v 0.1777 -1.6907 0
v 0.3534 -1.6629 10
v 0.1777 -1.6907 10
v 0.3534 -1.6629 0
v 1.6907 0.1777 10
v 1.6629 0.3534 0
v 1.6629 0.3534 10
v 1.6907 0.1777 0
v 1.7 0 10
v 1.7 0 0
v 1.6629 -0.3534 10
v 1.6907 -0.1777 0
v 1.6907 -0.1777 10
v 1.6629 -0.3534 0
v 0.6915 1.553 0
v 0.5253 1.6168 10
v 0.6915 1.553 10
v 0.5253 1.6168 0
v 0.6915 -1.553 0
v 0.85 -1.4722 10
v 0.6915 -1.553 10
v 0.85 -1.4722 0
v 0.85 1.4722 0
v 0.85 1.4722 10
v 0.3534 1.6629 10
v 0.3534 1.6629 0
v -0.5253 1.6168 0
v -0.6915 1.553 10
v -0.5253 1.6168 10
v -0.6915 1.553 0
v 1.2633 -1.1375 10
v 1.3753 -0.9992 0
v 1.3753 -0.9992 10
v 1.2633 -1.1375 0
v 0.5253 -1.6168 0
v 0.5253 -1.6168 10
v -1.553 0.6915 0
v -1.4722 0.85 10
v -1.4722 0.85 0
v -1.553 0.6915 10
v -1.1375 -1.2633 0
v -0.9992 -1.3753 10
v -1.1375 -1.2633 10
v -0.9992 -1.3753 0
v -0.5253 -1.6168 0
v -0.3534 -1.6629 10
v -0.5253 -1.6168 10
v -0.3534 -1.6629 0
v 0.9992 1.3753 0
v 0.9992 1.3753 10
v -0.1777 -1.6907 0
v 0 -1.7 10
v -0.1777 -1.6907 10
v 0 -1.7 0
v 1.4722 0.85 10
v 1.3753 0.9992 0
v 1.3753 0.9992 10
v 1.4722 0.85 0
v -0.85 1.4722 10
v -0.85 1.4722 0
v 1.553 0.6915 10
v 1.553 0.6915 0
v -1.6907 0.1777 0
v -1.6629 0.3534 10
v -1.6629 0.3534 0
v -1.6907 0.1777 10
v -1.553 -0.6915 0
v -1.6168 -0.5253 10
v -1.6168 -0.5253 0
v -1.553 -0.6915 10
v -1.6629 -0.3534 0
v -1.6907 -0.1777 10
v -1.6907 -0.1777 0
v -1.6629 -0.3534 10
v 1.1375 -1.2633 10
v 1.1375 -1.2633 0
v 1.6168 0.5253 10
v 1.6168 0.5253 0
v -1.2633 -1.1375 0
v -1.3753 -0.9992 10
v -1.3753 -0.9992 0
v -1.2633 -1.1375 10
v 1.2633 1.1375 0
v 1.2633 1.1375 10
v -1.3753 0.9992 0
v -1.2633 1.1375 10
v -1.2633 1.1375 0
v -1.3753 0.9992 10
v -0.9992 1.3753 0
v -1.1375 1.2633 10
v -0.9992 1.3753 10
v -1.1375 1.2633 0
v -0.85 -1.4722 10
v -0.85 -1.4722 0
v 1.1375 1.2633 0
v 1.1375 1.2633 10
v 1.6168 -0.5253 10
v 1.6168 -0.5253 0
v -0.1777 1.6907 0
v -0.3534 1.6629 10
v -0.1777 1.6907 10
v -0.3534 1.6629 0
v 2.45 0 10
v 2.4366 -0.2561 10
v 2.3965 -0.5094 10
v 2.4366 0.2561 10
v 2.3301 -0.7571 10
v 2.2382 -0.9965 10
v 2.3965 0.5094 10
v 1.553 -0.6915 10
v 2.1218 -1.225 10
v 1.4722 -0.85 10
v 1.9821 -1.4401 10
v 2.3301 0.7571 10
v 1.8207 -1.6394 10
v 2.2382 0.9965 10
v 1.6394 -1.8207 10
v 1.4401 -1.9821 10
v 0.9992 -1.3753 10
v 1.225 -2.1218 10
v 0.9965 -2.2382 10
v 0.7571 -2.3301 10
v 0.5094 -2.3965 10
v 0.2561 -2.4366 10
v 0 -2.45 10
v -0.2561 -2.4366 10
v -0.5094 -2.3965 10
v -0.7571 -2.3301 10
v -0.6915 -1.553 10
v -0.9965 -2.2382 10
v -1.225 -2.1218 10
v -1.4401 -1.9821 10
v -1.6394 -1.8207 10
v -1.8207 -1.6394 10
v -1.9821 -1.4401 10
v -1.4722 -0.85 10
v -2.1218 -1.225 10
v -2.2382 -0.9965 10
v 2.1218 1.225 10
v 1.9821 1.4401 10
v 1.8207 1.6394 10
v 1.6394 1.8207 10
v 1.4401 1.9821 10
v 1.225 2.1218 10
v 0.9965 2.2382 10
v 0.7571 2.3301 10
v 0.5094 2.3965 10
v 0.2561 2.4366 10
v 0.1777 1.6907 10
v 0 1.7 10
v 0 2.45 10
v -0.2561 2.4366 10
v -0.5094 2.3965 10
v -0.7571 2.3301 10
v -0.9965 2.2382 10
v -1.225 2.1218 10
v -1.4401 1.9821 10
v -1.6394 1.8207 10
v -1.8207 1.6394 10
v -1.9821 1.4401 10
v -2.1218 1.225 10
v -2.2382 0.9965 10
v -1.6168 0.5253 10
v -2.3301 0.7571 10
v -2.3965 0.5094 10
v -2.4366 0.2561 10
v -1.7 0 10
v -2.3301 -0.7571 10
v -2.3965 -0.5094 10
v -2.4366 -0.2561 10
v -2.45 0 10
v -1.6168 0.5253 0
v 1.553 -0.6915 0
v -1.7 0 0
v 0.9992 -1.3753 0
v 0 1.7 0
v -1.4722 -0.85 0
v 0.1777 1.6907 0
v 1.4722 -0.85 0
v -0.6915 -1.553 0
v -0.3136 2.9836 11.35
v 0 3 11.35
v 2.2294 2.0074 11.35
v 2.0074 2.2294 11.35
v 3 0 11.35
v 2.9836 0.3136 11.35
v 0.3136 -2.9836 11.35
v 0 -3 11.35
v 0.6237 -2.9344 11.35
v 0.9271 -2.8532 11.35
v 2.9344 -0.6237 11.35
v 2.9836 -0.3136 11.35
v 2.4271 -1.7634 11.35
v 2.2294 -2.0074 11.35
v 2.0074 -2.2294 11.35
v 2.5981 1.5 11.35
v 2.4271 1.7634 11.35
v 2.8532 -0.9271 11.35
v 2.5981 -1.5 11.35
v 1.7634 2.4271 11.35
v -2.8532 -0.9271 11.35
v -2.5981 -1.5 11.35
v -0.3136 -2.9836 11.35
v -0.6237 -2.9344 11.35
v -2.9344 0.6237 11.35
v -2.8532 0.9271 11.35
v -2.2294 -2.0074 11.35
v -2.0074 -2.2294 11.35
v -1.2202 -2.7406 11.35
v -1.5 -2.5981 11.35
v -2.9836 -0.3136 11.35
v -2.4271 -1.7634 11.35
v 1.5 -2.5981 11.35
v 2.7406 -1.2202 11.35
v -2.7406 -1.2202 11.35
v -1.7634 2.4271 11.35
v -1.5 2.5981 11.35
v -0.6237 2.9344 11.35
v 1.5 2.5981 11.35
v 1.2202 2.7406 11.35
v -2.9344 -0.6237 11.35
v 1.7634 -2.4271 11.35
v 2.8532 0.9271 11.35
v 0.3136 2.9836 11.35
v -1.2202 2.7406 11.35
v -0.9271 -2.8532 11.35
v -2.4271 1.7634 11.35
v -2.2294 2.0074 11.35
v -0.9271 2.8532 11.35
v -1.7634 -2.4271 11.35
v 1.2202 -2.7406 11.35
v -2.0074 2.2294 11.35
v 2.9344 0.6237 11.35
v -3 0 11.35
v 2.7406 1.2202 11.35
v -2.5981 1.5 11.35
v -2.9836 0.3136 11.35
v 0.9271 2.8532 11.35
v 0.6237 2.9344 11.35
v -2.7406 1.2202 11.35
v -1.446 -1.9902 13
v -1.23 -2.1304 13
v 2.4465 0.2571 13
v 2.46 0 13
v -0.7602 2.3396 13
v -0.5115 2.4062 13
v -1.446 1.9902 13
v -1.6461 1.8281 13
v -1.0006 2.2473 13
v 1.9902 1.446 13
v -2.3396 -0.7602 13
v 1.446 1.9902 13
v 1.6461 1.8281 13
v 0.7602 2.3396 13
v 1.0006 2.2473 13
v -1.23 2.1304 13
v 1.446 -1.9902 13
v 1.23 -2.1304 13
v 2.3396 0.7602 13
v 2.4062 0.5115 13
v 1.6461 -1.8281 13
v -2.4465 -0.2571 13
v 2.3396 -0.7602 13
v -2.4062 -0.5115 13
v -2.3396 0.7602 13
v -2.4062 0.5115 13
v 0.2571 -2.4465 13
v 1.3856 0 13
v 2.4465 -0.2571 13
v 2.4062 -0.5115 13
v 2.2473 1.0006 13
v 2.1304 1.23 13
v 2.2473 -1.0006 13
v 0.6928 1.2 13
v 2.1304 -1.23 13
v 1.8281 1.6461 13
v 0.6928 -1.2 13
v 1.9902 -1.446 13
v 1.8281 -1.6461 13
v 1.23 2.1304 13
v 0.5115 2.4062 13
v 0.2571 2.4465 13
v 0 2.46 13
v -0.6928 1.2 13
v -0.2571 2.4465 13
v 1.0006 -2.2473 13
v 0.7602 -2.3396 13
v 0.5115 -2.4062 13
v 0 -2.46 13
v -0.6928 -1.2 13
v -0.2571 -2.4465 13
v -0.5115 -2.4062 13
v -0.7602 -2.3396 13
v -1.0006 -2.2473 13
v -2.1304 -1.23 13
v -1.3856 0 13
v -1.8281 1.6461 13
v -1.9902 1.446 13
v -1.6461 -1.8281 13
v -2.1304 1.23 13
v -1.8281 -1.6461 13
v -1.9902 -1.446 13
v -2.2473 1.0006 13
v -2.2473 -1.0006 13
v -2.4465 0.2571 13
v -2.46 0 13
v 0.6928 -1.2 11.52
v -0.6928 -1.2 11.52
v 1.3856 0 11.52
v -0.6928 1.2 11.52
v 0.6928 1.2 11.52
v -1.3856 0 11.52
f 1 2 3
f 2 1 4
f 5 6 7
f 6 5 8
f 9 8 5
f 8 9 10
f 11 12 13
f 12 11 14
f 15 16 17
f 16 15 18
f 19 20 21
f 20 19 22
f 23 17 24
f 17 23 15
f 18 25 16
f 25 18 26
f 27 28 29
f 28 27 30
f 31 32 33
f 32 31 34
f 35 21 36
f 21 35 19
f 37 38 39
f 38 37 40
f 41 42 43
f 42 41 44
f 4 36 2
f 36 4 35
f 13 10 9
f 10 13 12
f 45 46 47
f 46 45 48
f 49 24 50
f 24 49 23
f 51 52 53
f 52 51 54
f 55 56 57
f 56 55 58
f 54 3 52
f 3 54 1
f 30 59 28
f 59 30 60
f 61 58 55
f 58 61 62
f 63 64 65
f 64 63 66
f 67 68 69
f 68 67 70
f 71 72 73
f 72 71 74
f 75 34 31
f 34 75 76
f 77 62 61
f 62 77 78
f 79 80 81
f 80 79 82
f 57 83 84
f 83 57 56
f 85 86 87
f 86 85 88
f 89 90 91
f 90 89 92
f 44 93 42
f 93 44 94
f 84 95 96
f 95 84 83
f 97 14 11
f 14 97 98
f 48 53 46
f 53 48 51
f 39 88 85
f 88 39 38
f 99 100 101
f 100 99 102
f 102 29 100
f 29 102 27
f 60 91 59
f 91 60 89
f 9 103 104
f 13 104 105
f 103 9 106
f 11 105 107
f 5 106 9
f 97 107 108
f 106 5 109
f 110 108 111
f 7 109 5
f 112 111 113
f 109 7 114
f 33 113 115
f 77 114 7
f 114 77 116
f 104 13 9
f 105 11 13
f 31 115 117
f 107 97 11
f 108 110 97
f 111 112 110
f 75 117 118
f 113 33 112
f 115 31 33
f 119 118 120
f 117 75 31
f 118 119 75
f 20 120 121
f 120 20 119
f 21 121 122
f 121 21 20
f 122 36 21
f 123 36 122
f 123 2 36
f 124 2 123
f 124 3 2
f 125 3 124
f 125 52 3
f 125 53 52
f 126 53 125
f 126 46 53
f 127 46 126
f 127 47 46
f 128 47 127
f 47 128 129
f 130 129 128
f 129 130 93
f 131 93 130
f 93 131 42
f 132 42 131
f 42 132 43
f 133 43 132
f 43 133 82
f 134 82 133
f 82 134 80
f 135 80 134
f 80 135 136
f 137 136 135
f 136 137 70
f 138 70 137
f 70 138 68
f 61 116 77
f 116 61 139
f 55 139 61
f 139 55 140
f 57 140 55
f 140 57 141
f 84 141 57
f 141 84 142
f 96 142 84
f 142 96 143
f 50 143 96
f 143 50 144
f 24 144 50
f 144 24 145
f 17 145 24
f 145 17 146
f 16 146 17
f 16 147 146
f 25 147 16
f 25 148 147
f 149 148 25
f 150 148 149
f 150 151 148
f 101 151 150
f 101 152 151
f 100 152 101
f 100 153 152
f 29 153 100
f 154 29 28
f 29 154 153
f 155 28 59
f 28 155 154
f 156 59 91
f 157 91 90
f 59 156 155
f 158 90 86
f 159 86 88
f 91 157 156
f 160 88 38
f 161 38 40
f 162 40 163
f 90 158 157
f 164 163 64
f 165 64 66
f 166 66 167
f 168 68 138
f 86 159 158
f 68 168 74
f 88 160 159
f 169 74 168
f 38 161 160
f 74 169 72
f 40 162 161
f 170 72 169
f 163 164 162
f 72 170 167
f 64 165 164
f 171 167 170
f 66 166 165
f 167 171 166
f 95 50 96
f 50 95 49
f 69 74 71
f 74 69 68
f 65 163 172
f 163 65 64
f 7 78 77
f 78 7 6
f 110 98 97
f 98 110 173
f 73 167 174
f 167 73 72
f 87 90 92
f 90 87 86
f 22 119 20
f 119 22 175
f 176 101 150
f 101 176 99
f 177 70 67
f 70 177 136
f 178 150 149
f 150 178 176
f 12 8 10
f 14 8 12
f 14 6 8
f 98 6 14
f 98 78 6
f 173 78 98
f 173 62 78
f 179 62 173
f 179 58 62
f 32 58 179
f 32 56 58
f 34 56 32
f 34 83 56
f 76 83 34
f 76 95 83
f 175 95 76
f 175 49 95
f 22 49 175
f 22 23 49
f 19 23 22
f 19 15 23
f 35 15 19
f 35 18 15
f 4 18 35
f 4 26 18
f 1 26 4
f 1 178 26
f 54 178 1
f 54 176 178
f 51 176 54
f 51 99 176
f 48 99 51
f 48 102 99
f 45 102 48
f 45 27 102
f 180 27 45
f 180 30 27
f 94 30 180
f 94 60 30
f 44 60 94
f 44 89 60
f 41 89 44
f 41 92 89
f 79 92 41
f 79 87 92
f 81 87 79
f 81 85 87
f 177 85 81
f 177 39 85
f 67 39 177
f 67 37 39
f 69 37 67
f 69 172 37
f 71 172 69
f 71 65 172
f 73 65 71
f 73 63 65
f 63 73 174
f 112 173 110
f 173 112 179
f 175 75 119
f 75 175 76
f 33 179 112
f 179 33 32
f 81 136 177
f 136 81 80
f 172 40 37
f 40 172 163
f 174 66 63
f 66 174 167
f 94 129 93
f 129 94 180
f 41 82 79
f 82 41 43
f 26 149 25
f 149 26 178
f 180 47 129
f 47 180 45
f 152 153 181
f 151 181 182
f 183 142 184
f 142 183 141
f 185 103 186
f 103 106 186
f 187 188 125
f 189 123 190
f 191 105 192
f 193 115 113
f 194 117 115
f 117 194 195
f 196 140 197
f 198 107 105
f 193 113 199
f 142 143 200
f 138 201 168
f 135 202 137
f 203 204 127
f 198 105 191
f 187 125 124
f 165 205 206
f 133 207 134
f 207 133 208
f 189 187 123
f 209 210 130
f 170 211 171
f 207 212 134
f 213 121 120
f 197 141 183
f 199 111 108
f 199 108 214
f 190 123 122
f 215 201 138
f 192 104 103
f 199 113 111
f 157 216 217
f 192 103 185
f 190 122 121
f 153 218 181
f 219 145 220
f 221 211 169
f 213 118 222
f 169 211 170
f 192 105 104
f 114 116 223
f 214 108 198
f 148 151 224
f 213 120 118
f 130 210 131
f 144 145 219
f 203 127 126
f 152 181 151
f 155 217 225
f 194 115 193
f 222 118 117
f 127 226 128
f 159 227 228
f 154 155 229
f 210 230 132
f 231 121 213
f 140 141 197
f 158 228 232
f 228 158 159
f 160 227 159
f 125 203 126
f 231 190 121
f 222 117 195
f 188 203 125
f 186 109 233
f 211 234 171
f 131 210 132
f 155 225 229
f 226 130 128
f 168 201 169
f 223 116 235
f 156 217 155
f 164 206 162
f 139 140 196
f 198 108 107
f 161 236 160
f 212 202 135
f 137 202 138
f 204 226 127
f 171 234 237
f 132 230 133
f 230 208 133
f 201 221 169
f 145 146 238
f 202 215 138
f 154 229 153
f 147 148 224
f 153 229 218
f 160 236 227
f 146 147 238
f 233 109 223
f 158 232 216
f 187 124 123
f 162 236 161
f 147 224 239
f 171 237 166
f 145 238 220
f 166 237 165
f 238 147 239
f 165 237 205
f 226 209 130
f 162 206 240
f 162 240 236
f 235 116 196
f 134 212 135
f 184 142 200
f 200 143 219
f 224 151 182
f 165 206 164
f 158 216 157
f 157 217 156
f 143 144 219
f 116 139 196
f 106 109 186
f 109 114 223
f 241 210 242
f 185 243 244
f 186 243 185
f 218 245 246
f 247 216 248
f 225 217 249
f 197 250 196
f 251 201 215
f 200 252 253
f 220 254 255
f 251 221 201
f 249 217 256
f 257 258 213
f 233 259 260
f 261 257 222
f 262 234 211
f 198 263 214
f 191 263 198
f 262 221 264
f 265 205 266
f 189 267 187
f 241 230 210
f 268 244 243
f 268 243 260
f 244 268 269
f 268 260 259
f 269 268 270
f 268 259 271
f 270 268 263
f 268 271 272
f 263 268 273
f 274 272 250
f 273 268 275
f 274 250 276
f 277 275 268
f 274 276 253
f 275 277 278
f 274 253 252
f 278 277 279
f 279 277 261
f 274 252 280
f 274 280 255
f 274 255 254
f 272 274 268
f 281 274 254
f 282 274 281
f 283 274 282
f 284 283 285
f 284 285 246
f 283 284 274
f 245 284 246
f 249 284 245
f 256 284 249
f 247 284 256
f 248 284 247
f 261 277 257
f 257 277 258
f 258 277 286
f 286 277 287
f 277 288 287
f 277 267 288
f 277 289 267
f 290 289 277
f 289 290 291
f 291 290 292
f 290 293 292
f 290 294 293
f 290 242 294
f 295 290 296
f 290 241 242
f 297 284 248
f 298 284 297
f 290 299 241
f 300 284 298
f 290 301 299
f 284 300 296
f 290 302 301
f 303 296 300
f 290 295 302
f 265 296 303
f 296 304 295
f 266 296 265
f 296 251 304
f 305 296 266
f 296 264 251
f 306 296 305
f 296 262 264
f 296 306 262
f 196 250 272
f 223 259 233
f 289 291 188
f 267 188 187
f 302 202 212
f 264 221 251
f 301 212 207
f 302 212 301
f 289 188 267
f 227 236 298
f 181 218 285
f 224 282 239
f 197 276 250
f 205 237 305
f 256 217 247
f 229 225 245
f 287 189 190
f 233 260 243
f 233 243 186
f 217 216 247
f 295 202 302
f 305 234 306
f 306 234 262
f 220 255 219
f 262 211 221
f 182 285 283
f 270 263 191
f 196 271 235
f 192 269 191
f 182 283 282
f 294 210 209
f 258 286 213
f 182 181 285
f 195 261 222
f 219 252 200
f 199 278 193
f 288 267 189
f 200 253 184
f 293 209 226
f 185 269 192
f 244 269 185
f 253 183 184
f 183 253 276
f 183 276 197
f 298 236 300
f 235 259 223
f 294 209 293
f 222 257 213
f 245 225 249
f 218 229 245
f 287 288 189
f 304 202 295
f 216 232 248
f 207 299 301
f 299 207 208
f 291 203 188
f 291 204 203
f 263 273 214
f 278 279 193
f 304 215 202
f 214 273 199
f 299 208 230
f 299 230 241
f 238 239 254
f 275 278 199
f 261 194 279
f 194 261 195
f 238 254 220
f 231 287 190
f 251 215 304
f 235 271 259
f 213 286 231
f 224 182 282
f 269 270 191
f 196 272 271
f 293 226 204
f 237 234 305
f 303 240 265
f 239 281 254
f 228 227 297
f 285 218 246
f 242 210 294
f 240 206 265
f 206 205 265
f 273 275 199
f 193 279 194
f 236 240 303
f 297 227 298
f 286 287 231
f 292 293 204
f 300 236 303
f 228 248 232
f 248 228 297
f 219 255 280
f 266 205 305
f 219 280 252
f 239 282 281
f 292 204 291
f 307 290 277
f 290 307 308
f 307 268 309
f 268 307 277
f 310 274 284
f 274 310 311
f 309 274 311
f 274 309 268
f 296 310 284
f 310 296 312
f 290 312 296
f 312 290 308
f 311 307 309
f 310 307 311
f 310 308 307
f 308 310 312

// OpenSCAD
// Low-profile button-head screw.
$fn = 60;
eps = 0.02;
shaft_d = 3.4;
head_d = 6;
head_h = 3;
shaft_l = 10;
socket_flat = head_d * 0.40;
difference() {
    union() {
        cylinder(d = shaft_d, h = shaft_l);
        translate([0, 0, shaft_l]) cylinder(d1 = shaft_d + 1.5, d2 = head_d, h = head_h * 0.45);
        translate([0, 0, shaft_l + head_h * 0.45]) cylinder(d1 = head_d, d2 = head_d * 0.82, h = head_h * 0.55);
    }
    translate([0, 0, shaft_l + head_h - head_h * 0.5 + eps])
        cylinder(d = socket_flat / cos(30), h = head_h * 0.5 + eps, $fn = 6);
}
